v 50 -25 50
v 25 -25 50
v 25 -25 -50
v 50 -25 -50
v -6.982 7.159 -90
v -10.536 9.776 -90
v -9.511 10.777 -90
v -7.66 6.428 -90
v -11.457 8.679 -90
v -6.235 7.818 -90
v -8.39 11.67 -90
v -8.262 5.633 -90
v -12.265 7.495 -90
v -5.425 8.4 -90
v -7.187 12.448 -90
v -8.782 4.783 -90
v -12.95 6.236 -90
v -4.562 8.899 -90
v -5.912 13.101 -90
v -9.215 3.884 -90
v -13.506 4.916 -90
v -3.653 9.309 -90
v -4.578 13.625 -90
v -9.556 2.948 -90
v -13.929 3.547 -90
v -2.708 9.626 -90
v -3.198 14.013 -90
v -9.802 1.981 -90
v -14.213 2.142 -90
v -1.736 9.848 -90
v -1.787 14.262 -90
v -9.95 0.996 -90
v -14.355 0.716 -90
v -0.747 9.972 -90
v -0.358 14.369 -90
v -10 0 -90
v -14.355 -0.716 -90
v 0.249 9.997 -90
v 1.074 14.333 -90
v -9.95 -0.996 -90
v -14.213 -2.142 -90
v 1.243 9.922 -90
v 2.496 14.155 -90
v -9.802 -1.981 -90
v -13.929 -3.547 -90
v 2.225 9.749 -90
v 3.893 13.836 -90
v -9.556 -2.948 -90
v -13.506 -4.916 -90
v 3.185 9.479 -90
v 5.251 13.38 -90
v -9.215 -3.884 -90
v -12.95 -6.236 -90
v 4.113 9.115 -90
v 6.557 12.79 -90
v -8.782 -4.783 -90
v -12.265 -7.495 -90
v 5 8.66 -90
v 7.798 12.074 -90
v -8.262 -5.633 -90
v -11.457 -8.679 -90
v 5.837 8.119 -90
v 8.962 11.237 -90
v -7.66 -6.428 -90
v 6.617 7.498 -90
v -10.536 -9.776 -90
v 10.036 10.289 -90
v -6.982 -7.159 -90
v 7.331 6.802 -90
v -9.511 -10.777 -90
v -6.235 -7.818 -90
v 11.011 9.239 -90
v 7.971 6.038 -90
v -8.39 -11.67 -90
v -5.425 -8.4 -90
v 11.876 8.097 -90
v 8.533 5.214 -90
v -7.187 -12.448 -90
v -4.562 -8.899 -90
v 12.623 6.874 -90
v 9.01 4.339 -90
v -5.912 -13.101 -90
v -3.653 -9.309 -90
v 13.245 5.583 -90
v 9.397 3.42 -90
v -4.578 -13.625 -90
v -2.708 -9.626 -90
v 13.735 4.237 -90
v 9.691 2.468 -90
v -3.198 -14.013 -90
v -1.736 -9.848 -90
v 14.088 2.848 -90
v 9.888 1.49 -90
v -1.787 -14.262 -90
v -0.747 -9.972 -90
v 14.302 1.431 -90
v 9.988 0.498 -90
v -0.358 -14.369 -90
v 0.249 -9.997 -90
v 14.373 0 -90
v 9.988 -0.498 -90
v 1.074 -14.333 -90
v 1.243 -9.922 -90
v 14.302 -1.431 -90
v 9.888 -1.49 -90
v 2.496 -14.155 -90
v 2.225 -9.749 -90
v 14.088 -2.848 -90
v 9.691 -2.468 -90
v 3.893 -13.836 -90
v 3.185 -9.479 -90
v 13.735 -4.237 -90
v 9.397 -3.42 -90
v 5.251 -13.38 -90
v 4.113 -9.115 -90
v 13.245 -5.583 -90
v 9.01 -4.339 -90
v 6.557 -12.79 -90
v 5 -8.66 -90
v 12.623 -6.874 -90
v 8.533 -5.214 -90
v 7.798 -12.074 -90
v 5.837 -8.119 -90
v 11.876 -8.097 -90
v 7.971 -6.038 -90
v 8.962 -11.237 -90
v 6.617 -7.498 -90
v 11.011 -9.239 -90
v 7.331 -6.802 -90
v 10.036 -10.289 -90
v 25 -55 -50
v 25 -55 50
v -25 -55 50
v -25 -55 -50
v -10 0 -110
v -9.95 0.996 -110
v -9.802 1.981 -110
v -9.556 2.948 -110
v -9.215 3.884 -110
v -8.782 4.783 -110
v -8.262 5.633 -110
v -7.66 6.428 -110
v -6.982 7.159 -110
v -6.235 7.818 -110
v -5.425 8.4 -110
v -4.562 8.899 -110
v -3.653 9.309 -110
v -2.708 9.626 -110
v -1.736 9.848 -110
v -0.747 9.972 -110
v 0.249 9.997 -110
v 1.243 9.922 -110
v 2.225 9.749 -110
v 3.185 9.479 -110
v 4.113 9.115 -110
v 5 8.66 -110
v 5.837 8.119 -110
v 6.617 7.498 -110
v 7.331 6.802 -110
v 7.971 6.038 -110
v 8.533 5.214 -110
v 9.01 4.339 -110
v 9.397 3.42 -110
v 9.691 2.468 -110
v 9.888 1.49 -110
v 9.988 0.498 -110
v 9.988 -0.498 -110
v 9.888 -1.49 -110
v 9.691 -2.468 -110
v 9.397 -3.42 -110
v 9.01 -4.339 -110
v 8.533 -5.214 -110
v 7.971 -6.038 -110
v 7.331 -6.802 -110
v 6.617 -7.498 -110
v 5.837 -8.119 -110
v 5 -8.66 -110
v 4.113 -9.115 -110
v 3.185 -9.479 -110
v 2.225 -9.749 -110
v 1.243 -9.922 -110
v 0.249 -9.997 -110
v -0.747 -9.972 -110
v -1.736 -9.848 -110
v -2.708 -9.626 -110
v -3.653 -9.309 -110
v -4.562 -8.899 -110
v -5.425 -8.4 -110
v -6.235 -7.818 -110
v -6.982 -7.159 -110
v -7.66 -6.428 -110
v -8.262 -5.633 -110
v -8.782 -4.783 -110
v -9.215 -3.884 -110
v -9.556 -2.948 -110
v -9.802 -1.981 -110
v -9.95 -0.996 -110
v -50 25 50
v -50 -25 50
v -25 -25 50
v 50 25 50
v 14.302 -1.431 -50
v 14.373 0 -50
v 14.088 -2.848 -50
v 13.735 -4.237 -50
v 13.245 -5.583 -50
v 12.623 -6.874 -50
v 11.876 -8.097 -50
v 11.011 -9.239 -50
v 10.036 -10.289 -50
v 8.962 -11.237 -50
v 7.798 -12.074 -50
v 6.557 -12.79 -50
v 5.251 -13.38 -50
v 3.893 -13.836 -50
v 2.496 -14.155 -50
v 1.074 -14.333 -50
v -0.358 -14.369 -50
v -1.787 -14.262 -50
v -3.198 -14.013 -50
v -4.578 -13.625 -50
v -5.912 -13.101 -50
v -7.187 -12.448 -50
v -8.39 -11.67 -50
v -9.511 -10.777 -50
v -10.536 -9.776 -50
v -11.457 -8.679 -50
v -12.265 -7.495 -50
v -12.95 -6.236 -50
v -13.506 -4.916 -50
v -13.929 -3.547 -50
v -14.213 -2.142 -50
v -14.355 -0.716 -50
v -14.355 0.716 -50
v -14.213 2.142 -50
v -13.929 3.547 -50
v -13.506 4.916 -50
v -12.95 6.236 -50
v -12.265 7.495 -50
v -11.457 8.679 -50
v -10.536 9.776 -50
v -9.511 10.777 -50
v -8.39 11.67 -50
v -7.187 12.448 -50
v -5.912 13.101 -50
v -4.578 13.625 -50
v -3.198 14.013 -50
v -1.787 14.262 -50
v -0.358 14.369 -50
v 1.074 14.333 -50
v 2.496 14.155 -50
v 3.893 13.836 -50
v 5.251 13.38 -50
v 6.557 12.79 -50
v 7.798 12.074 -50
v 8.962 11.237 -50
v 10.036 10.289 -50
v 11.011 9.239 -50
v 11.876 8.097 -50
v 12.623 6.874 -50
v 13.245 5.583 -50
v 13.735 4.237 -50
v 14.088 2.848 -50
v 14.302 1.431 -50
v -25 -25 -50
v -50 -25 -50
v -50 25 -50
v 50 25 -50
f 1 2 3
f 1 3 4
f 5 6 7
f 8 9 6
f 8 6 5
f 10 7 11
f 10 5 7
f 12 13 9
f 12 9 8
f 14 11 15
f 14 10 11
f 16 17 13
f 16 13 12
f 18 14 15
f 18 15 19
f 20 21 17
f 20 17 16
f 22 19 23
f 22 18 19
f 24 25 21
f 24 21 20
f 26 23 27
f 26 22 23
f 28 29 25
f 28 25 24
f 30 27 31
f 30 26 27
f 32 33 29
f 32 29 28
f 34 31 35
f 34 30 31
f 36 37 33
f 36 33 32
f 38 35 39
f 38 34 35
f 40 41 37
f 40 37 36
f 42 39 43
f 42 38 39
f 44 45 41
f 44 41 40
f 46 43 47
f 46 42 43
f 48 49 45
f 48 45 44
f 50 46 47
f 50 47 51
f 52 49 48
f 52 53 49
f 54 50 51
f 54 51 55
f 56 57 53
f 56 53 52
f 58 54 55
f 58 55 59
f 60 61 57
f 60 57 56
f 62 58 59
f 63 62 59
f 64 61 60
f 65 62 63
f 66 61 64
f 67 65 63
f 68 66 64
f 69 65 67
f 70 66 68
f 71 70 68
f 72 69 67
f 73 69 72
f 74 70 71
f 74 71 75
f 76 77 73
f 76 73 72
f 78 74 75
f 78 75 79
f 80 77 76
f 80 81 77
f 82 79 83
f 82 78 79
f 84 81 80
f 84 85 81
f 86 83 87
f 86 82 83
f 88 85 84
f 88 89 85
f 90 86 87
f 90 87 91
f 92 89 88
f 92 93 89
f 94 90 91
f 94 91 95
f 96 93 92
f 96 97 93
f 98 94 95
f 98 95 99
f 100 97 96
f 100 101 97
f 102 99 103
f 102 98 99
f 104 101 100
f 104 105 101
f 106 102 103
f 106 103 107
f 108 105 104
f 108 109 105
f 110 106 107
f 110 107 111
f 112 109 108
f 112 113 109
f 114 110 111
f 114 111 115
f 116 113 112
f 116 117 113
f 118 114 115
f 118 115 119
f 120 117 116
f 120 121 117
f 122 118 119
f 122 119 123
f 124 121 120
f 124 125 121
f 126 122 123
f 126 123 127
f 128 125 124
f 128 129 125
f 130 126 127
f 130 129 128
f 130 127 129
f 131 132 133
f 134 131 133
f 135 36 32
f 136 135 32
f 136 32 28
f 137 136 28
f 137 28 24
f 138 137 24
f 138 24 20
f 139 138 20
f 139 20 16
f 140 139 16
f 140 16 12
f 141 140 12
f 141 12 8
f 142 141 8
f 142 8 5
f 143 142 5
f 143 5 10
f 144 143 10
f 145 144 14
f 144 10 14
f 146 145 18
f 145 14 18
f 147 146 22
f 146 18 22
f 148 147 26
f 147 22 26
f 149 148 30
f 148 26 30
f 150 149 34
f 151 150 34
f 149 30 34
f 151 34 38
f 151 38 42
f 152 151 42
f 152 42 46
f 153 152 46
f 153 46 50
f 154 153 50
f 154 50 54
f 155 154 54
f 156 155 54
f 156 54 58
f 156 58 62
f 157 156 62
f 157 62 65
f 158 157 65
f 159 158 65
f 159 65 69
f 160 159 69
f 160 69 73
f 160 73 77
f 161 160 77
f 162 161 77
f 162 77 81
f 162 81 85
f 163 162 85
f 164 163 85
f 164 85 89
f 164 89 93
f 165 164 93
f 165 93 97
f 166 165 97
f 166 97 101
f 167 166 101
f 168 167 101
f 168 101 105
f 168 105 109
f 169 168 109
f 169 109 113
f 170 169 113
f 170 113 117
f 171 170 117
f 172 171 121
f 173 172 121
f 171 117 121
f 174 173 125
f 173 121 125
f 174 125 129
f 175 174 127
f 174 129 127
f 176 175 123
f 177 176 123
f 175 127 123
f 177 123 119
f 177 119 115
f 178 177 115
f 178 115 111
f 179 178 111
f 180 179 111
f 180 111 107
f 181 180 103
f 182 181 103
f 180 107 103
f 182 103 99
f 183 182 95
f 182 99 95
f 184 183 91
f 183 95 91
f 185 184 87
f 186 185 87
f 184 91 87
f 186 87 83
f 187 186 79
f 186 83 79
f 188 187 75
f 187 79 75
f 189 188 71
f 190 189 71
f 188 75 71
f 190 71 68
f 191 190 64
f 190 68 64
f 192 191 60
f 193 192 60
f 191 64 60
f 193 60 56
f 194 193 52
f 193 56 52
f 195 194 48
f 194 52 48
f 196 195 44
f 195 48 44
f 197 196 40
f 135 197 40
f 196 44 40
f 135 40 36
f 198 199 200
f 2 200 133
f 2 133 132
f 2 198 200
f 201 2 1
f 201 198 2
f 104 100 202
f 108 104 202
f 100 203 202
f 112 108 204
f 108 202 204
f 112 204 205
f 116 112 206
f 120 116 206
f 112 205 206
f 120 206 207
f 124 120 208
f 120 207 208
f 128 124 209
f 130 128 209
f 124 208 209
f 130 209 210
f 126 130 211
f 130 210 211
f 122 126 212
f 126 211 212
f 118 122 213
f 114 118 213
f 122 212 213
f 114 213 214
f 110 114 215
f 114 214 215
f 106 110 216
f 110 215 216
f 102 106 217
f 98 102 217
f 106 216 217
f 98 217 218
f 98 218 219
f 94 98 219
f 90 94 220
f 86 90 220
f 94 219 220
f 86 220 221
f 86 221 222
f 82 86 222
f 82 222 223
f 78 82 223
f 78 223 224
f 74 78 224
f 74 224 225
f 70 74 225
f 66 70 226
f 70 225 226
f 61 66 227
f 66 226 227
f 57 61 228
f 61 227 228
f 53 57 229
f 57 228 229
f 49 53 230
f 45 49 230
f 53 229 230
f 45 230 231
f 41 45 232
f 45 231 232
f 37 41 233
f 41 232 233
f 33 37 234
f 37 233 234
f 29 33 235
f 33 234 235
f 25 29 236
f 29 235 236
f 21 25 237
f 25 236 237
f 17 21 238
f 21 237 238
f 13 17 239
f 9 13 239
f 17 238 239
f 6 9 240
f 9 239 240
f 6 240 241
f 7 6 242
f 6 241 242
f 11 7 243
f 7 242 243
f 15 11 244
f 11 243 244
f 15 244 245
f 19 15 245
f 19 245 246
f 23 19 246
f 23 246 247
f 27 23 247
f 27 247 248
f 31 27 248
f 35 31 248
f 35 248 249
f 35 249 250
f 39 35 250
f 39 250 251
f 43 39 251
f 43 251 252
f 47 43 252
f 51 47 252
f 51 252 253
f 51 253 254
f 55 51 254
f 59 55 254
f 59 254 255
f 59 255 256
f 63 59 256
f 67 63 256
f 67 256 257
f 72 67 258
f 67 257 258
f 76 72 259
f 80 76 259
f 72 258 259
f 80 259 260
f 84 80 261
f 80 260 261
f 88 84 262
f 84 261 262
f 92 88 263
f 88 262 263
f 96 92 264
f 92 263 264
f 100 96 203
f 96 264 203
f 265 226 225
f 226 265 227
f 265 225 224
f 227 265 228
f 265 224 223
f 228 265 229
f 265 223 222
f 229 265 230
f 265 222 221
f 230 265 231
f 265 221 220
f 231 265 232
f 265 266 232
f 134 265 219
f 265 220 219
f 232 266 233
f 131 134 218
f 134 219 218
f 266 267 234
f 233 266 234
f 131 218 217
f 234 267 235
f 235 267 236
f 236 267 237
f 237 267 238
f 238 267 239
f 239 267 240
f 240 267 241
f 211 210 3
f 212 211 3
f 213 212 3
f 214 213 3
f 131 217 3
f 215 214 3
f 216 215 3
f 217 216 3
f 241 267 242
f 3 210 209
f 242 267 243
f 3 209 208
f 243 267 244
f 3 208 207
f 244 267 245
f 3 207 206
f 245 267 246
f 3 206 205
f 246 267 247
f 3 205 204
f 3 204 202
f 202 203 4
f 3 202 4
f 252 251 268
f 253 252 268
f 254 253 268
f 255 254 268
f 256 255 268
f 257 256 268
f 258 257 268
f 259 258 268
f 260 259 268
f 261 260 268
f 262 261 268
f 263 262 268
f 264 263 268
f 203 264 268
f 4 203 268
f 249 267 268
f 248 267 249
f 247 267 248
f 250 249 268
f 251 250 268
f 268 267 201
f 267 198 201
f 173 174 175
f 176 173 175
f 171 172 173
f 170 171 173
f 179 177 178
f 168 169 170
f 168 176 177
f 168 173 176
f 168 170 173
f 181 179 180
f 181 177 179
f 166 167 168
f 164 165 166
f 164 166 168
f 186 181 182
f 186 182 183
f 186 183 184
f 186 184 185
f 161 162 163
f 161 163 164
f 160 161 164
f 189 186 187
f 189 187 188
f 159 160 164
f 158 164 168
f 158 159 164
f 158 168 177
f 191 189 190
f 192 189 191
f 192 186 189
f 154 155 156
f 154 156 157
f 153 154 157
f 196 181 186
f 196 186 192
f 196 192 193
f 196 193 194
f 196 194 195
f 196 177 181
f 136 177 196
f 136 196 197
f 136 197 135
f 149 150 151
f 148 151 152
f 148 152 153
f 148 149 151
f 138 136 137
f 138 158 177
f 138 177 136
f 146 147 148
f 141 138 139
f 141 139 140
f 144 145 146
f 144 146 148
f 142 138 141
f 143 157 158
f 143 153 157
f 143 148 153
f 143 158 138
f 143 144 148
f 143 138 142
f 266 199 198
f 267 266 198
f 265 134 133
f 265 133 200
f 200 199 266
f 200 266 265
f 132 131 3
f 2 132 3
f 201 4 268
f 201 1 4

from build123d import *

# Parameters (mm, degrees)
SKETCH_1_W               = 100
SKETCH_1_H               = 50
SKETCH_1_W_2             = 50
SKETCH_1_H_2             = 30
EXTRUDE_1_DEPTH          = 50
SKETCH_2_R               = 14.373245618
EXTRUDE_2_DEPTH          = 30
CUT_EXTRUDE_2_DEPTH      = 154.378616502
CUT_EXTRUDE_2_DEPTH_BACK = 154.378616502
SKETCH_4_W               = 100
SKETCH_4_H               = 50
SKETCH_5_R               = 10
EXTRUDE_3_DEPTH          = 30
SKETCH_6_R               = 14.373245618
EXTRUDE_4_DEPTH          = 10


with BuildPart() as part:
    # 草图1 → 凸台-拉伸1 (new, symmetric)
    with BuildSketch(Plane.XY):
        Rectangle(SKETCH_1_W, SKETCH_1_H)
        with Locations((0, -40)):
            Rectangle(SKETCH_1_W_2, SKETCH_1_H_2)
        Polygon((25, -55), (-25, -55), (-50, -55), (-50, -105), (50, -105), (50, -55), align=None)
    extrude(amount=EXTRUDE_1_DEPTH, both=True)

    # 草图2 → 凸台-拉伸2 (add)
    with BuildSketch(Plane(origin=(0, 0, -50), x_dir=(-1, 0, 0), z_dir=(0, 0, -1))):
        with Locations(Location((0, 0, 0), (0, 0, 180))):
            Circle(SKETCH_2_R)
    extrude(amount=EXTRUDE_2_DEPTH)

    # 草图4 → 切除-拉伸2 (cut, two sides: drawn at the far end of the back side and taken through both)
    with BuildSketch(Plane(origin=(0, 0, -50), x_dir=(-1, 0, 0), z_dir=(0, 0, -1)).offset(-CUT_EXTRUDE_2_DEPTH_BACK)):
        with Locations((0, -80)):
            Rectangle(SKETCH_4_W, SKETCH_4_H)
    extrude(amount=CUT_EXTRUDE_2_DEPTH + CUT_EXTRUDE_2_DEPTH_BACK, mode=Mode.SUBTRACT)

    # 草图5 → 凸台-拉伸3 (add)
    with BuildSketch(Plane(origin=(0, 0, -80), x_dir=(-1, 0, 0), z_dir=(0, 0, -1))):
        Circle(SKETCH_5_R)
    extrude(amount=EXTRUDE_3_DEPTH)

    # 草图6 → 凸台-拉伸4 (add)
    with BuildSketch(Plane(origin=(0, 0, -80), x_dir=(-1, 0, 0), z_dir=(0, 0, -1))):
        with Locations(Location((0, 0, 0), (0, 0, 180))):
            Circle(SKETCH_6_R)
    extrude(amount=EXTRUDE_4_DEPTH)


solid = part.part
